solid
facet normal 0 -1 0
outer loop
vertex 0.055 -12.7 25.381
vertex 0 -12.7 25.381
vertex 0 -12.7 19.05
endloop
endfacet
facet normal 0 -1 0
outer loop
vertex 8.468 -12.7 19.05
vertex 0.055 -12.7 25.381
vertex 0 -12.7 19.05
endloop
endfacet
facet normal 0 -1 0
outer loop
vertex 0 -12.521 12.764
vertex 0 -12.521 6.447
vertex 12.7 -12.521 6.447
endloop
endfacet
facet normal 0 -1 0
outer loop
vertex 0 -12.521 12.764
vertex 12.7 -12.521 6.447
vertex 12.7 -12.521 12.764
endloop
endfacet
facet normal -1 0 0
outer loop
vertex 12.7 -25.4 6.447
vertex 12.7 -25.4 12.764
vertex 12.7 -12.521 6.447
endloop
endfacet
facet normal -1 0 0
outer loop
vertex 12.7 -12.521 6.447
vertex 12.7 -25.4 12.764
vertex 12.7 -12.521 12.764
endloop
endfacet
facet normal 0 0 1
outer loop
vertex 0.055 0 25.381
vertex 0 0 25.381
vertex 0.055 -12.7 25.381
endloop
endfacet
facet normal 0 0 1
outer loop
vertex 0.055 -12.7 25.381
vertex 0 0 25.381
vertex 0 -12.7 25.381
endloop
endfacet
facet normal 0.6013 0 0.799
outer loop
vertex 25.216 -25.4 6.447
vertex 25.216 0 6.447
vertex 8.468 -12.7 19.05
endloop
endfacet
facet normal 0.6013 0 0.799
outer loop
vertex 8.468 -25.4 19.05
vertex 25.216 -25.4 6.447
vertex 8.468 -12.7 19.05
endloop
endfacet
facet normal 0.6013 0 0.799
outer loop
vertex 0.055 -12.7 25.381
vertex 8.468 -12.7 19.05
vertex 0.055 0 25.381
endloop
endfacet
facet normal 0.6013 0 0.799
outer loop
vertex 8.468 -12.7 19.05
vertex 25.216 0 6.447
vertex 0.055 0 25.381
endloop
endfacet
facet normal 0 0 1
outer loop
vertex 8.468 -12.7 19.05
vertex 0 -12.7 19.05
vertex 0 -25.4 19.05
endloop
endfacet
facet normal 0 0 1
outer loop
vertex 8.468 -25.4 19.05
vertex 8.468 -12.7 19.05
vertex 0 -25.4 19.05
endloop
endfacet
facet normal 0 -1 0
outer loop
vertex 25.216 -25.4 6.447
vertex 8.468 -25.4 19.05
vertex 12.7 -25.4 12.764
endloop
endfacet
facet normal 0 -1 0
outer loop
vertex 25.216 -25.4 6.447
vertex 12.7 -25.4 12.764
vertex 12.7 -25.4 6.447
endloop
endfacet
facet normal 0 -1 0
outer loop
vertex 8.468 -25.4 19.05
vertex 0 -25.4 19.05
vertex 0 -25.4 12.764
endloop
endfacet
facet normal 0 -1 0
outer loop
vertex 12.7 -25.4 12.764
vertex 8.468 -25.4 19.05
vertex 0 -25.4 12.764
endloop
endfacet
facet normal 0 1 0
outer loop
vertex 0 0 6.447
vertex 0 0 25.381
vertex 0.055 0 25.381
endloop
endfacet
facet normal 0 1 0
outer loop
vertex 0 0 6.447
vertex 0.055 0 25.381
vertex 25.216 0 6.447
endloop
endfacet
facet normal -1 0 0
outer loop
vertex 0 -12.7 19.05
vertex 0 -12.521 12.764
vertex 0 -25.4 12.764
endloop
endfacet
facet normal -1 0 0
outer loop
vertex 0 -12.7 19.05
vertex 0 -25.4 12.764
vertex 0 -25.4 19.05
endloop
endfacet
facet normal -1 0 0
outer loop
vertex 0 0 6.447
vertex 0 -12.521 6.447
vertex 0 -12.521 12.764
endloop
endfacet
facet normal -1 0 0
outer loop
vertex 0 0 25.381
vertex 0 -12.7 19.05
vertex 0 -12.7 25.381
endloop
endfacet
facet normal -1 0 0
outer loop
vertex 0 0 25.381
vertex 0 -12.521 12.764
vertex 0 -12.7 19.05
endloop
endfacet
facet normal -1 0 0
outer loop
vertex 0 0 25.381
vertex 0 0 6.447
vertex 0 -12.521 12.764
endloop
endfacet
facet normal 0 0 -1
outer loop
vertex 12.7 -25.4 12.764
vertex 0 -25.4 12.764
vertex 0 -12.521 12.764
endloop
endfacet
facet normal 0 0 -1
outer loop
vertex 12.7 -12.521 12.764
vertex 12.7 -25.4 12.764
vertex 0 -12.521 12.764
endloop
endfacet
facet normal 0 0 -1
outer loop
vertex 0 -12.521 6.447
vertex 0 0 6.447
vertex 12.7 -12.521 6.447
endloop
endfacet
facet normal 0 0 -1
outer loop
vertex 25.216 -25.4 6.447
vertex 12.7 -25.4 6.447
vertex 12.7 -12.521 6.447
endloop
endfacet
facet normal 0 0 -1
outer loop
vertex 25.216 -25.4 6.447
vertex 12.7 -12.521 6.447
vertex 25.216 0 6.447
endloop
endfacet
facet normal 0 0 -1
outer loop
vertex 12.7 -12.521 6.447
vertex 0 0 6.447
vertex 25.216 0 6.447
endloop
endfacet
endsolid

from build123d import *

# Parameters (mm, degrees)
F0_W     = 25.4
F0_H     = 6.35
F1_DEPTH = 38.1
F3_DEPTH = 25.4
F4_W     = 12.91742
F4_H     = 6.35
F5_DEPTH = 12.7
F7_DEPTH = 25.4


with BuildPart() as f1:
    # F0 (on Front) → F1 (new body)
    with BuildSketch(Plane.XZ):
        with Locations((12.7, 3.175)):
            Rectangle(F0_W, F0_H)
    extrude(amount=F1_DEPTH)

    # F2 (on Right) → F3 (join)
    with BuildSketch(Plane.YZ):
        Polygon((0, 6.330987), (0, 25.380987), (-12.7, 25.380987), (-12.7, 19.05), (-25.4, 19.05), (-25.4, 6.330987), (-12.7, 6.330987), align=None)
    extrude(amount=F3_DEPTH)

    # F4 (on Right) → F5 (cut)
    with BuildSketch(Plane.YZ):
        with Locations((-18.979252, 9.588845)):
            Rectangle(F4_W, F4_H)
    extrude(amount=F5_DEPTH, mode=Mode.SUBTRACT)

    # F6 (on Front) → F7 (intersect)
    with BuildSketch(Plane.XZ):
        Polygon((25.21595, 6.447089), (0, 25.42259), (0, 6.447089), align=None)
    extrude(amount=F7_DEPTH, mode=Mode.INTERSECT)


solid = f1.part
